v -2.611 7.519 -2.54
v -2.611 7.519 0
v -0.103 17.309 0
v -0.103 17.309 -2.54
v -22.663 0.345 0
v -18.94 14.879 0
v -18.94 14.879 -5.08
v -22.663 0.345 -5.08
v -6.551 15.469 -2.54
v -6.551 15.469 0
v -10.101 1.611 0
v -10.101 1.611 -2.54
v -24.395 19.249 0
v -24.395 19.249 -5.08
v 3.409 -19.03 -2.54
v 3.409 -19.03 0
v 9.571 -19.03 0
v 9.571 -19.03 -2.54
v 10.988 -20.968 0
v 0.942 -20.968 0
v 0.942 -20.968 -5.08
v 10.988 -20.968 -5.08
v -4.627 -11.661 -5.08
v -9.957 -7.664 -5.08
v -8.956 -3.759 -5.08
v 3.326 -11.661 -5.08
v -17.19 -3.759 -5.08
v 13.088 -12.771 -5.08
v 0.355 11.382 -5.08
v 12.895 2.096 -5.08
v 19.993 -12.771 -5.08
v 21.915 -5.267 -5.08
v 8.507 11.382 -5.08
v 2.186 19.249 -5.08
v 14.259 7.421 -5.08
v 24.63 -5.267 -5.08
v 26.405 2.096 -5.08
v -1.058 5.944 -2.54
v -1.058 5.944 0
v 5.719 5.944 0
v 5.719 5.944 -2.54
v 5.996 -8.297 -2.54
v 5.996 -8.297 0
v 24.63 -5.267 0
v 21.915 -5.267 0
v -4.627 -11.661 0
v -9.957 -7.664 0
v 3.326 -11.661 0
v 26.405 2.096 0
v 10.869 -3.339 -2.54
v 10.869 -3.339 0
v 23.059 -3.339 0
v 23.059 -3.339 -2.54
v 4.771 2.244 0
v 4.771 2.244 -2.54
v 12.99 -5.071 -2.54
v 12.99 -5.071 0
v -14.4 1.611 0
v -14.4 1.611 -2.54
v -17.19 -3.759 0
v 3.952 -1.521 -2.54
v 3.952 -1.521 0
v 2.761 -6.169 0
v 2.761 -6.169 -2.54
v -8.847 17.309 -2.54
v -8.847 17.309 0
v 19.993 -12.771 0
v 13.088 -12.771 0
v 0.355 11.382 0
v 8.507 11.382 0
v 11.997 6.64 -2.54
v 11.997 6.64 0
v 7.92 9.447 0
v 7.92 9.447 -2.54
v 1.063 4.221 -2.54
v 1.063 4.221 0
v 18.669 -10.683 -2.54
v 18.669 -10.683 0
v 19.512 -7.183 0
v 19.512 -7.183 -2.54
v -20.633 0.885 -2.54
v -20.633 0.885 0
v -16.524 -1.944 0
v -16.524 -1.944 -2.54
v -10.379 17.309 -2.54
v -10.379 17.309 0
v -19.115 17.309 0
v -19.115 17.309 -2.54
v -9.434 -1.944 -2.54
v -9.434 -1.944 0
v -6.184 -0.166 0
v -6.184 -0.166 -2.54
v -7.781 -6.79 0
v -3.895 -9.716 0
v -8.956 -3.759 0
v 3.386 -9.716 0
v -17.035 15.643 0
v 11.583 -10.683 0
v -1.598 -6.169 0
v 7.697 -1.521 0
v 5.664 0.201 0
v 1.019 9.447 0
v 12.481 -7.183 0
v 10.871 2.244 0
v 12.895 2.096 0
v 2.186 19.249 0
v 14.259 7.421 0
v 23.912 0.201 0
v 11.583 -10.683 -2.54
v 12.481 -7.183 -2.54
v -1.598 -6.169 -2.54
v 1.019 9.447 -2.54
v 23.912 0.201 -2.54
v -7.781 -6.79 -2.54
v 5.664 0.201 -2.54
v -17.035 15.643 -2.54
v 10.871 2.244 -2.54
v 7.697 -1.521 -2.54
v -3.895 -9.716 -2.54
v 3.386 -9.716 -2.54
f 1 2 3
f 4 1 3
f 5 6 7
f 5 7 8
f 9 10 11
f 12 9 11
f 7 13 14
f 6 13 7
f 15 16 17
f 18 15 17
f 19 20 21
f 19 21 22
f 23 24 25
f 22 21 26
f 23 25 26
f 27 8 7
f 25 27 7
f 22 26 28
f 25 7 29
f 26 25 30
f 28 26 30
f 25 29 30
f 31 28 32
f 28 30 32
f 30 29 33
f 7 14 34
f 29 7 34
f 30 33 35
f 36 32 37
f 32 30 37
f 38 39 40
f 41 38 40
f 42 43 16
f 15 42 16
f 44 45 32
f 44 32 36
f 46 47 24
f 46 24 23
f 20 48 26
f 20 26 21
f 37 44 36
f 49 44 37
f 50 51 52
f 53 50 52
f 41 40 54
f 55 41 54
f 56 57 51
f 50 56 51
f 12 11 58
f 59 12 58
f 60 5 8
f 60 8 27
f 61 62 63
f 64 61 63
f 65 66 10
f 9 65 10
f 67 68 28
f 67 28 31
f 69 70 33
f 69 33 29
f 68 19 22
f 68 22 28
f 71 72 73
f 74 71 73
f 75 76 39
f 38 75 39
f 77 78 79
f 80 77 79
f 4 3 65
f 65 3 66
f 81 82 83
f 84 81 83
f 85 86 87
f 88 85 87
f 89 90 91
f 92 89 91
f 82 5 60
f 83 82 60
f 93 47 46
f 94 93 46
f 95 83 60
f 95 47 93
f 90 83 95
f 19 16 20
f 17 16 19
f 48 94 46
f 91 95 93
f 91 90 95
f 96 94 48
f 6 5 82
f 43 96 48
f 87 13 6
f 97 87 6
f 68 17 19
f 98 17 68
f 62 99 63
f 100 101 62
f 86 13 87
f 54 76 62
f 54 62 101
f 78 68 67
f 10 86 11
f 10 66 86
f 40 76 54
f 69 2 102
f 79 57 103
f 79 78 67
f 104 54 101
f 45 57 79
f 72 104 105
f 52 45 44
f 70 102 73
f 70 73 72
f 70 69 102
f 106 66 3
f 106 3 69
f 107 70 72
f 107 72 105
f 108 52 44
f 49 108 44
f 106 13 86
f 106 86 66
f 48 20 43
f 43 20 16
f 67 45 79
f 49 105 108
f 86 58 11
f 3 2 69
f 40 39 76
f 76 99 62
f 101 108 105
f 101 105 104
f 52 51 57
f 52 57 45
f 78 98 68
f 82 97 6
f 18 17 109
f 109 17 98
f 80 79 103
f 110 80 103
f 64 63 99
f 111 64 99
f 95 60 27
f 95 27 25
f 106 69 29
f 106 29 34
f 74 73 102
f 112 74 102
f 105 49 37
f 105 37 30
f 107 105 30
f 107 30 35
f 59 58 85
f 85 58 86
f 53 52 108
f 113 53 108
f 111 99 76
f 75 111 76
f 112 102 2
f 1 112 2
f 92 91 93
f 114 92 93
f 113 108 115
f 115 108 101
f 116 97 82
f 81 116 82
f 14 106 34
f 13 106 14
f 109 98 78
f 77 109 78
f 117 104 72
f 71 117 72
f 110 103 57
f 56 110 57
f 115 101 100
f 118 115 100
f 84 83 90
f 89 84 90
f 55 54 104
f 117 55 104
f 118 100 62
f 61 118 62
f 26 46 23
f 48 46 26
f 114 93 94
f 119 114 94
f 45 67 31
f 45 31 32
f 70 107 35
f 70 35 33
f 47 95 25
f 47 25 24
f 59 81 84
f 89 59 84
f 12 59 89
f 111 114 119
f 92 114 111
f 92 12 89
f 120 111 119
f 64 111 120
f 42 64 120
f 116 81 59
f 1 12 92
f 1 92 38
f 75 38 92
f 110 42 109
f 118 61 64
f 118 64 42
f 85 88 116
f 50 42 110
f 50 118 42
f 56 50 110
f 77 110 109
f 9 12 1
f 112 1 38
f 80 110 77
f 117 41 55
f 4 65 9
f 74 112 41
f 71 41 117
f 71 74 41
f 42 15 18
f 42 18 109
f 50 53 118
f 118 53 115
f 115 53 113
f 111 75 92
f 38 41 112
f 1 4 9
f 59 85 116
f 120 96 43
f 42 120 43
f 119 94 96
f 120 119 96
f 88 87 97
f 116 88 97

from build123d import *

# Parameters (mm, degrees)
F1_DEPTH = 5.08
F2_DEPTH = 2.54


with BuildPart() as f1:
    # F0 (on Top) → F1 (new body)
    with BuildSketch(Plane.XY):
        Polygon((2.1859223297, 19.248547896), (-24.3953090747, 19.248547896), (-18.9395717811, 14.8791704217), (-22.6627825954, 0.3451996698), (-17.1898484699, -3.7593468121), (-8.9564369545, -3.7593468121), (-9.9565906694, -7.6635589463), (-4.6268214747, -11.6607357615), (3.3259746574, -11.6607357615), (0.9416517448, -20.9682075121), (10.988304789, -20.9682075121), (13.0882485999, -12.7708414613), (19.9927147226, -12.7708414613), (21.9150878042, -5.2666426563), (24.6298443066, -5.2666426563), (26.4046909253, 2.0960416775), (12.8948415761, 2.0960416775), (14.2589756145, 7.4210918036), (8.5066062772, 11.382008699), (0.3546772284, 11.382008699), align=None)
        Polygon((-20.6326617241, 0.8851447814), (-17.0350794991, 15.643025438), (-19.1151439831, 17.3089023695), (-10.3791536142, 17.3089023695), (-14.4004393661, 1.6113626868), (-10.1006558786, 1.6113626868), (-6.550601553, 15.469397676), (-8.847462929, 17.3089023695), (-0.1028961172, 17.3089023695), (-2.6109213046, 7.5185449236), (1.0187151687, 9.4473759333), (7.9203285277, 9.4473759333), (11.997169684, 6.6401797905), (10.8709626259, 2.2439043015), (4.7710491344, 2.2439043015), (5.7189009901, 5.9439502658), (-1.0584690608, 5.9439502658), (1.063386056, 4.2209116121), (-1.5982844269, -6.1692174671), (2.7608703822, -6.1692174671), (3.9516054808, -1.521049539), (7.6969756434, -1.521049539), (5.6644616028, 0.2005538166), (23.9124173919, 0.2005538166), (23.0591944391, -3.3389133138), (10.8685915669, -3.3389133138), (12.9904473821, -5.0705817218), (12.4812849915, -7.1827653424), (19.5123602947, -7.1827653424), (18.668519463, -10.6833121536), (11.5833220383, -10.6833121536), (9.571338977, -19.0297213635), (3.4085946778, -19.0297213635), (5.9958781117, -8.2967650591), (3.3862596999, -9.7163282335), (-3.8950548818, -9.7163282335), (-7.7814006557, -6.790401414), (-6.184447335, -0.1656806791), (-9.4342138618, -1.9436366856), (-16.5244725843, -1.9436366856), align=None, mode=Mode.SUBTRACT)
        Polygon((-19.1151439831, 17.3089023695), (-17.0350794991, 15.643025438), (-20.6326617241, 0.8851447814), (-16.5244725843, -1.9436366856), (-9.4342138618, -1.9436366856), (-6.184447335, -0.1656806791), (-7.7814006557, -6.790401414), (-3.8950548818, -9.7163282335), (3.3862596999, -9.7163282335), (5.9958781117, -8.2967650591), (3.4085946778, -19.0297213635), (9.571338977, -19.0297213635), (11.5833220383, -10.6833121536), (18.668519463, -10.6833121536), (19.5123602947, -7.1827653424), (12.4812849915, -7.1827653424), (12.9904473821, -5.0705817218), (10.8685915669, -3.3389133138), (23.0591944391, -3.3389133138), (23.9124173919, 0.2005538166), (5.6644616028, 0.2005538166), (7.6969756434, -1.521049539), (3.9516054808, -1.521049539), (2.7608703822, -6.1692174671), (-1.5982844269, -6.1692174671), (1.063386056, 4.2209116121), (-1.0584690608, 5.9439502658), (5.7189009901, 5.9439502658), (4.7710491344, 2.2439043015), (10.8709626259, 2.2439043015), (11.997169684, 6.6401797905), (7.9203285277, 9.4473759333), (1.0187151687, 9.4473759333), (-2.6109213046, 7.5185449236), (-0.1028961172, 17.3089023695), (-8.847462929, 17.3089023695), (-6.550601553, 15.469397676), (-10.1006558786, 1.6113626868), (-14.4004393661, 1.6113626868), (-10.3791536142, 17.3089023695), align=None)
        Polygon((-1.4470629355, 6.2614502658), (-1.7529480132, 6.0988993801), (0.7053412177, 4.1026615912), (-2.007371729, -6.4867174671), (3.0072878326, -6.4867174671), (4.1980229312, -1.838549539), (8.4534338099, -1.838549539), (8.4722807786, -1.7616673308), (6.530533387, -0.1169461834), (23.509286259, -0.1169461834), (22.8091362278, -3.0214133138), (9.9773968665, -3.0214133138), (12.6349923897, -5.1903044212), (12.0781538585, -7.5002653424), (19.1092291617, -7.5002653424), (18.4184612518, -10.3658121536), (11.333263827, -10.3658121536), (9.3212807658, -18.7122213635), (3.8117258108, -18.7122213635), (6.4720393651, -7.6763105851), (3.305492183, -9.3988282335), (-3.788897508, -9.3988282335), (-7.4238874577, -6.662140558), (-5.7077402086, 0.4570382668), (-9.5153891072, -1.6261366856), (-16.4257337365, -1.6261366856), (-20.2723691619, 1.0225463793), (-16.6786986539, 15.7643805222), (-18.2107953637, 16.9914023695), (-10.7882409164, 16.9914023695), (-14.8095266683, 1.2938626868), (-9.8542384282, 1.2938626868), (-6.1921799664, 15.5891183762), (-7.9431143096, 16.9914023695), (-0.5119834194, 16.9914023695), (-3.0969436407, 6.9007203948), (1.0978376576, 9.1298759333), (7.8215896798, 9.1298759333), (11.6346173395, 6.5043342141), (10.6245451755, 2.5614043015), (5.1801364366, 2.5614043015), (6.1279882922, 6.2614502658), align=None, mode=Mode.SUBTRACT)
        Polygon((-5.9958964755, -7.1322803998), (-6.8447431549, -6.4807981253), (-3.836085248, 6.0001668234), (1.1804265973, 8.6659995258), (7.5871106237, 8.6659995258), (8.8139669276, 7.8212213871), (1.4880838571, 7.8212213871), (-1.4470629355, 6.2614502658), (6.1279882922, 6.2614502658), (5.1801364366, 2.5614043015), (10.6245451755, 2.5614043015), (11.6346173395, 6.5043342141), (7.8215896798, 9.1298759333), (1.0978376576, 9.1298759333), (-3.0969436407, 6.9007203948), (-0.5119834194, 16.9914023695), (-7.9431143096, 16.9914023695), (-6.1921799664, 15.5891183762), (-9.8542384282, 1.2938626868), (-14.8095266683, 1.2938626868), (-10.7882409164, 16.9914023695), (-18.2107953637, 16.9914023695), (-16.6786986539, 15.7643805222), (-20.2723691619, 1.0225463793), (-16.4257337365, -1.6261366856), (-9.5153891072, -1.6261366856), (-5.7077402086, 0.4570382668), (-7.4238874577, -6.662140558), (-3.788897508, -9.3988282335), (3.305492183, -9.3988282335), (6.4720393651, -7.6763105851), (3.8117258108, -18.7122213635), (9.3212807658, -18.7122213635), (11.333263827, -10.3658121536), (18.4184612518, -10.3658121536), (19.1092291617, -7.5002653424), (12.0781538585, -7.5002653424), (12.6349923897, -5.1903044212), (9.9773968665, -3.0214133138), (22.8091362278, -3.0214133138), (23.509286259, -0.1169461834), (6.530533387, -0.1169461834), (8.4722807786, -1.7616673308), (8.6163925007, -1.1737941531), (7.9285055295, -0.7001348718), (22.8997431695, -0.7001348718), (22.7018537103, -1.521049539), (9.492916055, -1.521049539), (5.4628625857, -18.2391204024), (4.4329841621, -18.2391204024), (8.4534338099, -1.838549539), (4.1980229312, -1.838549539), (3.0072878326, -6.4867174671), (-2.007371729, -6.4867174671), (0.7053412177, 4.1026615912), (-1.7529480132, 6.0988993801), (-2.9611672112, 5.456837655), align=None)
        Polygon((-1.8931780942, -7.869553083), (-1.6672882484, -6.9988858886), (3.3901352435, -6.9988858886), (4.5163077443, -2.3271285994), (7.2051645257, -2.3271285994), (6.9932386076, -3.2062714054), (5.2349027246, -3.2062714054), (4.1107733525, -7.869553083), align=None, mode=Mode.SUBTRACT)
        Polygon((12.0627228171, -8.8622216706), (12.3017746955, -7.946931757), (18.4374414384, -7.946931757), (18.2168019088, -8.8622216706), align=None, mode=Mode.SUBTRACT)
        Polygon((-18.894339994, 0.7209487154), (-19.6556132287, 1.3443980133), (-16.0978934319, 15.9387563591), (-16.7280736738, 16.4434535624), (-11.4680863917, 16.4434535624), (-11.6794740259, 15.5763063276), (-15.2729954571, 15.5763063276), align=None, mode=Mode.SUBTRACT)
        Polygon((-14.4821710257, 0.8135896642), (-9.4944098964, 0.8135896642), (-5.6433276886, 15.8467207341), (-6.5030540089, 16.5352562364), (-1.1275938014, 16.5352562364), (-1.3768279931, 15.5623426319), (-4.9125822261, 15.5623426319), (-8.9262763228, -0.1055621736), (-14.7176329046, -0.1055621736), align=None, mode=Mode.SUBTRACT)
        Polygon((5.8288373984, 2.9955036685), (6.5831555985, 5.9439502658), (7.4867149815, 5.9439502658), (6.7759632724, 2.9955036685), align=None, mode=Mode.SUBTRACT)
        Polygon((8.4722807786, -1.7616673308), (8.4534338099, -1.838549539), (4.4329841621, -18.2391204024), (5.4628625857, -18.2391204024), (9.492916055, -1.521049539), (22.7018537103, -1.521049539), (22.8997431695, -0.7001348718), (7.9285055295, -0.7001348718), (8.6163925007, -1.1737941531), align=None)
        Polygon((-3.836085248, 6.0001668234), (-6.8447431549, -6.4807981253), (-5.9958964755, -7.1322803998), (-2.9611672112, 5.456837655), (-1.7529480132, 6.0988993801), (-1.9531231096, 6.2614502658), (-1.4470629355, 6.2614502658), (1.4880838571, 7.8212213871), (8.8139669276, 7.8212213871), (7.5871106237, 8.6659995258), (1.1804265973, 8.6659995258), align=None)
        Polygon((-5.6433276886, 15.8467207341), (-9.4944098964, 0.8135896642), (-14.4821710257, 0.8135896642), (-14.7176329046, -0.1055621736), (-8.9262763228, -0.1055621736), (-4.9125822261, 15.5623426319), (-1.3768279931, 15.5623426319), (-1.1275938014, 16.5352562364), (-6.5030540089, 16.5352562364), align=None)
        Polygon((-16.0978934319, 15.9387563591), (-19.6556132287, 1.3443980133), (-18.894339994, 0.7209487154), (-15.2729954571, 15.5763063276), (-11.6794740259, 15.5763063276), (-11.4680863917, 16.4434535624), (-16.7280736738, 16.4434535624), align=None)
        Polygon((3.3901352435, -6.9988858886), (-1.6672882484, -6.9988858886), (-1.8931780942, -7.869553083), (4.1107733525, -7.869553083), (5.2349027246, -3.2062714054), (6.9932386076, -3.2062714054), (7.2051645257, -2.3271285994), (4.5163077443, -2.3271285994), align=None)
        Polygon((18.4374414384, -7.946931757), (12.3017746955, -7.946931757), (12.0627228171, -8.8622216706), (18.2168019088, -8.8622216706), align=None)
        Polygon((7.4867149815, 5.9439502658), (6.5831555985, 5.9439502658), (5.8288373984, 2.9955036685), (6.7759632724, 2.9955036685), align=None)
        Polygon((-1.9531231096, 6.2614502658), (-1.7529480132, 6.0988993801), (-1.4470629355, 6.2614502658), align=None)
    extrude(amount=-F1_DEPTH)

    # F0 (on Top) → F2 (cut)
    with BuildSketch(Plane.XY):
        Polygon((-19.1151439831, 17.3089023695), (-17.0350794991, 15.643025438), (-20.6326617241, 0.8851447814), (-16.5244725843, -1.9436366856), (-9.4342138618, -1.9436366856), (-6.184447335, -0.1656806791), (-7.7814006557, -6.790401414), (-3.8950548818, -9.7163282335), (3.3862596999, -9.7163282335), (5.9958781117, -8.2967650591), (3.4085946778, -19.0297213635), (9.571338977, -19.0297213635), (11.5833220383, -10.6833121536), (18.668519463, -10.6833121536), (19.5123602947, -7.1827653424), (12.4812849915, -7.1827653424), (12.9904473821, -5.0705817218), (10.8685915669, -3.3389133138), (23.0591944391, -3.3389133138), (23.9124173919, 0.2005538166), (5.6644616028, 0.2005538166), (7.6969756434, -1.521049539), (3.9516054808, -1.521049539), (2.7608703822, -6.1692174671), (-1.5982844269, -6.1692174671), (1.063386056, 4.2209116121), (-1.0584690608, 5.9439502658), (5.7189009901, 5.9439502658), (4.7710491344, 2.2439043015), (10.8709626259, 2.2439043015), (11.997169684, 6.6401797905), (7.9203285277, 9.4473759333), (1.0187151687, 9.4473759333), (-2.6109213046, 7.5185449236), (-0.1028961172, 17.3089023695), (-8.847462929, 17.3089023695), (-6.550601553, 15.469397676), (-10.1006558786, 1.6113626868), (-14.4004393661, 1.6113626868), (-10.3791536142, 17.3089023695), align=None)
        Polygon((-1.4470629355, 6.2614502658), (-1.7529480132, 6.0988993801), (0.7053412177, 4.1026615912), (-2.007371729, -6.4867174671), (3.0072878326, -6.4867174671), (4.1980229312, -1.838549539), (8.4534338099, -1.838549539), (8.4722807786, -1.7616673308), (6.530533387, -0.1169461834), (23.509286259, -0.1169461834), (22.8091362278, -3.0214133138), (9.9773968665, -3.0214133138), (12.6349923897, -5.1903044212), (12.0781538585, -7.5002653424), (19.1092291617, -7.5002653424), (18.4184612518, -10.3658121536), (11.333263827, -10.3658121536), (9.3212807658, -18.7122213635), (3.8117258108, -18.7122213635), (6.4720393651, -7.6763105851), (3.305492183, -9.3988282335), (-3.788897508, -9.3988282335), (-7.4238874577, -6.662140558), (-5.7077402086, 0.4570382668), (-9.5153891072, -1.6261366856), (-16.4257337365, -1.6261366856), (-20.2723691619, 1.0225463793), (-16.6786986539, 15.7643805222), (-18.2107953637, 16.9914023695), (-10.7882409164, 16.9914023695), (-14.8095266683, 1.2938626868), (-9.8542384282, 1.2938626868), (-6.1921799664, 15.5891183762), (-7.9431143096, 16.9914023695), (-0.5119834194, 16.9914023695), (-3.0969436407, 6.9007203948), (1.0978376576, 9.1298759333), (7.8215896798, 9.1298759333), (11.6346173395, 6.5043342141), (10.6245451755, 2.5614043015), (5.1801364366, 2.5614043015), (6.1279882922, 6.2614502658), align=None, mode=Mode.SUBTRACT)
        Polygon((-5.9958964755, -7.1322803998), (-6.8447431549, -6.4807981253), (-3.836085248, 6.0001668234), (1.1804265973, 8.6659995258), (7.5871106237, 8.6659995258), (8.8139669276, 7.8212213871), (1.4880838571, 7.8212213871), (-1.4470629355, 6.2614502658), (6.1279882922, 6.2614502658), (5.1801364366, 2.5614043015), (10.6245451755, 2.5614043015), (11.6346173395, 6.5043342141), (7.8215896798, 9.1298759333), (1.0978376576, 9.1298759333), (-3.0969436407, 6.9007203948), (-0.5119834194, 16.9914023695), (-7.9431143096, 16.9914023695), (-6.1921799664, 15.5891183762), (-9.8542384282, 1.2938626868), (-14.8095266683, 1.2938626868), (-10.7882409164, 16.9914023695), (-18.2107953637, 16.9914023695), (-16.6786986539, 15.7643805222), (-20.2723691619, 1.0225463793), (-16.4257337365, -1.6261366856), (-9.5153891072, -1.6261366856), (-5.7077402086, 0.4570382668), (-7.4238874577, -6.662140558), (-3.788897508, -9.3988282335), (3.305492183, -9.3988282335), (6.4720393651, -7.6763105851), (3.8117258108, -18.7122213635), (9.3212807658, -18.7122213635), (11.333263827, -10.3658121536), (18.4184612518, -10.3658121536), (19.1092291617, -7.5002653424), (12.0781538585, -7.5002653424), (12.6349923897, -5.1903044212), (9.9773968665, -3.0214133138), (22.8091362278, -3.0214133138), (23.509286259, -0.1169461834), (6.530533387, -0.1169461834), (8.4722807786, -1.7616673308), (8.6163925007, -1.1737941531), (7.9285055295, -0.7001348718), (22.8997431695, -0.7001348718), (22.7018537103, -1.521049539), (9.492916055, -1.521049539), (5.4628625857, -18.2391204024), (4.4329841621, -18.2391204024), (8.4534338099, -1.838549539), (4.1980229312, -1.838549539), (3.0072878326, -6.4867174671), (-2.007371729, -6.4867174671), (0.7053412177, 4.1026615912), (-1.7529480132, 6.0988993801), (-2.9611672112, 5.456837655), align=None)
        Polygon((-1.8931780942, -7.869553083), (-1.6672882484, -6.9988858886), (3.3901352435, -6.9988858886), (4.5163077443, -2.3271285994), (7.2051645257, -2.3271285994), (6.9932386076, -3.2062714054), (5.2349027246, -3.2062714054), (4.1107733525, -7.869553083), align=None, mode=Mode.SUBTRACT)
        Polygon((12.0627228171, -8.8622216706), (12.3017746955, -7.946931757), (18.4374414384, -7.946931757), (18.2168019088, -8.8622216706), align=None, mode=Mode.SUBTRACT)
        Polygon((-18.894339994, 0.7209487154), (-19.6556132287, 1.3443980133), (-16.0978934319, 15.9387563591), (-16.7280736738, 16.4434535624), (-11.4680863917, 16.4434535624), (-11.6794740259, 15.5763063276), (-15.2729954571, 15.5763063276), align=None, mode=Mode.SUBTRACT)
        Polygon((-14.4821710257, 0.8135896642), (-9.4944098964, 0.8135896642), (-5.6433276886, 15.8467207341), (-6.5030540089, 16.5352562364), (-1.1275938014, 16.5352562364), (-1.3768279931, 15.5623426319), (-4.9125822261, 15.5623426319), (-8.9262763228, -0.1055621736), (-14.7176329046, -0.1055621736), align=None, mode=Mode.SUBTRACT)
        Polygon((5.8288373984, 2.9955036685), (6.5831555985, 5.9439502658), (7.4867149815, 5.9439502658), (6.7759632724, 2.9955036685), align=None, mode=Mode.SUBTRACT)
        Polygon((8.4722807786, -1.7616673308), (8.4534338099, -1.838549539), (4.4329841621, -18.2391204024), (5.4628625857, -18.2391204024), (9.492916055, -1.521049539), (22.7018537103, -1.521049539), (22.8997431695, -0.7001348718), (7.9285055295, -0.7001348718), (8.6163925007, -1.1737941531), align=None)
        Polygon((-3.836085248, 6.0001668234), (-6.8447431549, -6.4807981253), (-5.9958964755, -7.1322803998), (-2.9611672112, 5.456837655), (-1.7529480132, 6.0988993801), (-1.9531231096, 6.2614502658), (-1.4470629355, 6.2614502658), (1.4880838571, 7.8212213871), (8.8139669276, 7.8212213871), (7.5871106237, 8.6659995258), (1.1804265973, 8.6659995258), align=None)
        Polygon((-5.6433276886, 15.8467207341), (-9.4944098964, 0.8135896642), (-14.4821710257, 0.8135896642), (-14.7176329046, -0.1055621736), (-8.9262763228, -0.1055621736), (-4.9125822261, 15.5623426319), (-1.3768279931, 15.5623426319), (-1.1275938014, 16.5352562364), (-6.5030540089, 16.5352562364), align=None)
        Polygon((-16.0978934319, 15.9387563591), (-19.6556132287, 1.3443980133), (-18.894339994, 0.7209487154), (-15.2729954571, 15.5763063276), (-11.6794740259, 15.5763063276), (-11.4680863917, 16.4434535624), (-16.7280736738, 16.4434535624), align=None)
        Polygon((3.3901352435, -6.9988858886), (-1.6672882484, -6.9988858886), (-1.8931780942, -7.869553083), (4.1107733525, -7.869553083), (5.2349027246, -3.2062714054), (6.9932386076, -3.2062714054), (7.2051645257, -2.3271285994), (4.5163077443, -2.3271285994), align=None)
        Polygon((18.4374414384, -7.946931757), (12.3017746955, -7.946931757), (12.0627228171, -8.8622216706), (18.2168019088, -8.8622216706), align=None)
        Polygon((7.4867149815, 5.9439502658), (6.5831555985, 5.9439502658), (5.8288373984, 2.9955036685), (6.7759632724, 2.9955036685), align=None)
        Polygon((-1.9531231096, 6.2614502658), (-1.7529480132, 6.0988993801), (-1.4470629355, 6.2614502658), align=None)
    extrude(amount=-F2_DEPTH, mode=Mode.SUBTRACT)


solid = f1.part
